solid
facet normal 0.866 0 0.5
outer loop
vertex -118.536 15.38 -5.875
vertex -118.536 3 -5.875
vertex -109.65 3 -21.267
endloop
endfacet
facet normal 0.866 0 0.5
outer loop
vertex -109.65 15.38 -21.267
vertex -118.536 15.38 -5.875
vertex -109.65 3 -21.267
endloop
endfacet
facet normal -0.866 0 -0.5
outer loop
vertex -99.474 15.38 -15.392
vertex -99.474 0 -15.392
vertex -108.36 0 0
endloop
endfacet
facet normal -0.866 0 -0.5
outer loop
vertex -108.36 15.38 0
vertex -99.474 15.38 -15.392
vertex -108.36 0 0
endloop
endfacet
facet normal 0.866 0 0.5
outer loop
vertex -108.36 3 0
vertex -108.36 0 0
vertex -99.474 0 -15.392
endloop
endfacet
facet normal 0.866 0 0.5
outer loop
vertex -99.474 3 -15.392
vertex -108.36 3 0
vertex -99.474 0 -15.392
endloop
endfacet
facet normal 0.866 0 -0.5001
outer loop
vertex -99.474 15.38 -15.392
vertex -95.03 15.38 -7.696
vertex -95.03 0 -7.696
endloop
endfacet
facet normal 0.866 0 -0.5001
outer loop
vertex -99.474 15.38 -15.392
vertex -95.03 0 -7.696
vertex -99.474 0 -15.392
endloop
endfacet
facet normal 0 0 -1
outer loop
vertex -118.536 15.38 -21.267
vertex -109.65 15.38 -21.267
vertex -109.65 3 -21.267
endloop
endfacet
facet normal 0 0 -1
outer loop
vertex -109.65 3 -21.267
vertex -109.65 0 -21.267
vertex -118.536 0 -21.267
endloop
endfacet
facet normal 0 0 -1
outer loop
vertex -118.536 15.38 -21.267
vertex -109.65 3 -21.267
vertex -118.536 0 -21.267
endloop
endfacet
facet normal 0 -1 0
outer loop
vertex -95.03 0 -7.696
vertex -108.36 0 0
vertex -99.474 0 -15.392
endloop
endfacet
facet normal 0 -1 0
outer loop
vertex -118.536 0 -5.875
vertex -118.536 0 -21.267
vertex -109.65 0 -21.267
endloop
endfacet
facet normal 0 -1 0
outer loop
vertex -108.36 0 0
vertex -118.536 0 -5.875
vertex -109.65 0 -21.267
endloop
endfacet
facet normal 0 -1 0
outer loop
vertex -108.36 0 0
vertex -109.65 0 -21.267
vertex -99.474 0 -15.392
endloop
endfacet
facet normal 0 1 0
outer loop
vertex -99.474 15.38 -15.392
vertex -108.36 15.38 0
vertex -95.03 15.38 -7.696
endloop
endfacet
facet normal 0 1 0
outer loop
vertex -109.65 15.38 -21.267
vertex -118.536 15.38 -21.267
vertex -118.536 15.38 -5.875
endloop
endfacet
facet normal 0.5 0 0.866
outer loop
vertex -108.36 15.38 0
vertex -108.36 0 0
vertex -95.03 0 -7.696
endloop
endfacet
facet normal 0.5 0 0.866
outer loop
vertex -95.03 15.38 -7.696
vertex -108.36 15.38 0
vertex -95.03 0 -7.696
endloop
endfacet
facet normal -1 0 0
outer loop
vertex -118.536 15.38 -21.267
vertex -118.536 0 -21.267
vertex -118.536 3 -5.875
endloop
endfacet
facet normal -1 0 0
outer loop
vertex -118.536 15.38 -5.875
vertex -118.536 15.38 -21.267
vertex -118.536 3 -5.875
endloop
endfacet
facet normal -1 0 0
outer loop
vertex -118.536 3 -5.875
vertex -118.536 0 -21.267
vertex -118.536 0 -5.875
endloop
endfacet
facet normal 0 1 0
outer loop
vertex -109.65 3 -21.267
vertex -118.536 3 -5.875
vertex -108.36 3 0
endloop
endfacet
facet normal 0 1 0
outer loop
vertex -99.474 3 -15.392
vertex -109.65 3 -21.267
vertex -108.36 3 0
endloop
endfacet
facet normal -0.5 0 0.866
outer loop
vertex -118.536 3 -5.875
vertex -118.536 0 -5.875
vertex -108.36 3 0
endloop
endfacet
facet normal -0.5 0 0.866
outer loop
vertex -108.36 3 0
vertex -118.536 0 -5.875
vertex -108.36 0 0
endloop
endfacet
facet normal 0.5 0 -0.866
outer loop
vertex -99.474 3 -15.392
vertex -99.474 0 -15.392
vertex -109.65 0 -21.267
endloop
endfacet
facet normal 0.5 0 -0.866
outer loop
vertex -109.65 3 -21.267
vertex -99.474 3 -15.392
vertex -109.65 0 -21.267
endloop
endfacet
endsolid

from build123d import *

# Parameters (mm, degrees)
BOSS_EXTRUDE3_DEPTH   = 15.38
BOSS_EXTRUDE3_2_DEPTH = 15.38
BOSS_EXTRUDE7_DEPTH   = 3


with BuildPart() as part:
    # Sketch1 → Boss-Extrude3 (new body)
    with BuildSketch(Plane(origin=(0, 0, 0), x_dir=(1, 0, 0), z_dir=(0, 1, 0))):
        Polygon((-108.360471904, 0), (-99.473720558, 15.392304845), (-95.030344885, 7.696152423), align=None)
    extrude(amount=BOSS_EXTRUDE3_DEPTH)


with BuildPart() as body_2:
    # Sketch1 → Boss-Extrude3 2 (new body)
    with BuildSketch(Plane(origin=(0, 0, 0), x_dir=(1, 0, 0), z_dir=(0, 1, 0))):
        Polygon((-118.536270399, 21.267304845), (-109.649519053, 21.267304845), (-118.536270399, 5.875), align=None)
    extrude(amount=BOSS_EXTRUDE3_2_DEPTH)

    # Sketch1<8> → Boss-Extrude7 (add)
    with BuildSketch(Plane(origin=(0, 0, 0), x_dir=(1, 0, 0), z_dir=(0, 1, 0))):
        Polygon((-99.473720558, 15.392304845), (-109.649519053, 21.267304845), (-118.536270399, 5.875), (-108.360471904, 0), align=None)
    extrude(amount=BOSS_EXTRUDE7_DEPTH)


solid = Compound([part.part, body_2.part])
